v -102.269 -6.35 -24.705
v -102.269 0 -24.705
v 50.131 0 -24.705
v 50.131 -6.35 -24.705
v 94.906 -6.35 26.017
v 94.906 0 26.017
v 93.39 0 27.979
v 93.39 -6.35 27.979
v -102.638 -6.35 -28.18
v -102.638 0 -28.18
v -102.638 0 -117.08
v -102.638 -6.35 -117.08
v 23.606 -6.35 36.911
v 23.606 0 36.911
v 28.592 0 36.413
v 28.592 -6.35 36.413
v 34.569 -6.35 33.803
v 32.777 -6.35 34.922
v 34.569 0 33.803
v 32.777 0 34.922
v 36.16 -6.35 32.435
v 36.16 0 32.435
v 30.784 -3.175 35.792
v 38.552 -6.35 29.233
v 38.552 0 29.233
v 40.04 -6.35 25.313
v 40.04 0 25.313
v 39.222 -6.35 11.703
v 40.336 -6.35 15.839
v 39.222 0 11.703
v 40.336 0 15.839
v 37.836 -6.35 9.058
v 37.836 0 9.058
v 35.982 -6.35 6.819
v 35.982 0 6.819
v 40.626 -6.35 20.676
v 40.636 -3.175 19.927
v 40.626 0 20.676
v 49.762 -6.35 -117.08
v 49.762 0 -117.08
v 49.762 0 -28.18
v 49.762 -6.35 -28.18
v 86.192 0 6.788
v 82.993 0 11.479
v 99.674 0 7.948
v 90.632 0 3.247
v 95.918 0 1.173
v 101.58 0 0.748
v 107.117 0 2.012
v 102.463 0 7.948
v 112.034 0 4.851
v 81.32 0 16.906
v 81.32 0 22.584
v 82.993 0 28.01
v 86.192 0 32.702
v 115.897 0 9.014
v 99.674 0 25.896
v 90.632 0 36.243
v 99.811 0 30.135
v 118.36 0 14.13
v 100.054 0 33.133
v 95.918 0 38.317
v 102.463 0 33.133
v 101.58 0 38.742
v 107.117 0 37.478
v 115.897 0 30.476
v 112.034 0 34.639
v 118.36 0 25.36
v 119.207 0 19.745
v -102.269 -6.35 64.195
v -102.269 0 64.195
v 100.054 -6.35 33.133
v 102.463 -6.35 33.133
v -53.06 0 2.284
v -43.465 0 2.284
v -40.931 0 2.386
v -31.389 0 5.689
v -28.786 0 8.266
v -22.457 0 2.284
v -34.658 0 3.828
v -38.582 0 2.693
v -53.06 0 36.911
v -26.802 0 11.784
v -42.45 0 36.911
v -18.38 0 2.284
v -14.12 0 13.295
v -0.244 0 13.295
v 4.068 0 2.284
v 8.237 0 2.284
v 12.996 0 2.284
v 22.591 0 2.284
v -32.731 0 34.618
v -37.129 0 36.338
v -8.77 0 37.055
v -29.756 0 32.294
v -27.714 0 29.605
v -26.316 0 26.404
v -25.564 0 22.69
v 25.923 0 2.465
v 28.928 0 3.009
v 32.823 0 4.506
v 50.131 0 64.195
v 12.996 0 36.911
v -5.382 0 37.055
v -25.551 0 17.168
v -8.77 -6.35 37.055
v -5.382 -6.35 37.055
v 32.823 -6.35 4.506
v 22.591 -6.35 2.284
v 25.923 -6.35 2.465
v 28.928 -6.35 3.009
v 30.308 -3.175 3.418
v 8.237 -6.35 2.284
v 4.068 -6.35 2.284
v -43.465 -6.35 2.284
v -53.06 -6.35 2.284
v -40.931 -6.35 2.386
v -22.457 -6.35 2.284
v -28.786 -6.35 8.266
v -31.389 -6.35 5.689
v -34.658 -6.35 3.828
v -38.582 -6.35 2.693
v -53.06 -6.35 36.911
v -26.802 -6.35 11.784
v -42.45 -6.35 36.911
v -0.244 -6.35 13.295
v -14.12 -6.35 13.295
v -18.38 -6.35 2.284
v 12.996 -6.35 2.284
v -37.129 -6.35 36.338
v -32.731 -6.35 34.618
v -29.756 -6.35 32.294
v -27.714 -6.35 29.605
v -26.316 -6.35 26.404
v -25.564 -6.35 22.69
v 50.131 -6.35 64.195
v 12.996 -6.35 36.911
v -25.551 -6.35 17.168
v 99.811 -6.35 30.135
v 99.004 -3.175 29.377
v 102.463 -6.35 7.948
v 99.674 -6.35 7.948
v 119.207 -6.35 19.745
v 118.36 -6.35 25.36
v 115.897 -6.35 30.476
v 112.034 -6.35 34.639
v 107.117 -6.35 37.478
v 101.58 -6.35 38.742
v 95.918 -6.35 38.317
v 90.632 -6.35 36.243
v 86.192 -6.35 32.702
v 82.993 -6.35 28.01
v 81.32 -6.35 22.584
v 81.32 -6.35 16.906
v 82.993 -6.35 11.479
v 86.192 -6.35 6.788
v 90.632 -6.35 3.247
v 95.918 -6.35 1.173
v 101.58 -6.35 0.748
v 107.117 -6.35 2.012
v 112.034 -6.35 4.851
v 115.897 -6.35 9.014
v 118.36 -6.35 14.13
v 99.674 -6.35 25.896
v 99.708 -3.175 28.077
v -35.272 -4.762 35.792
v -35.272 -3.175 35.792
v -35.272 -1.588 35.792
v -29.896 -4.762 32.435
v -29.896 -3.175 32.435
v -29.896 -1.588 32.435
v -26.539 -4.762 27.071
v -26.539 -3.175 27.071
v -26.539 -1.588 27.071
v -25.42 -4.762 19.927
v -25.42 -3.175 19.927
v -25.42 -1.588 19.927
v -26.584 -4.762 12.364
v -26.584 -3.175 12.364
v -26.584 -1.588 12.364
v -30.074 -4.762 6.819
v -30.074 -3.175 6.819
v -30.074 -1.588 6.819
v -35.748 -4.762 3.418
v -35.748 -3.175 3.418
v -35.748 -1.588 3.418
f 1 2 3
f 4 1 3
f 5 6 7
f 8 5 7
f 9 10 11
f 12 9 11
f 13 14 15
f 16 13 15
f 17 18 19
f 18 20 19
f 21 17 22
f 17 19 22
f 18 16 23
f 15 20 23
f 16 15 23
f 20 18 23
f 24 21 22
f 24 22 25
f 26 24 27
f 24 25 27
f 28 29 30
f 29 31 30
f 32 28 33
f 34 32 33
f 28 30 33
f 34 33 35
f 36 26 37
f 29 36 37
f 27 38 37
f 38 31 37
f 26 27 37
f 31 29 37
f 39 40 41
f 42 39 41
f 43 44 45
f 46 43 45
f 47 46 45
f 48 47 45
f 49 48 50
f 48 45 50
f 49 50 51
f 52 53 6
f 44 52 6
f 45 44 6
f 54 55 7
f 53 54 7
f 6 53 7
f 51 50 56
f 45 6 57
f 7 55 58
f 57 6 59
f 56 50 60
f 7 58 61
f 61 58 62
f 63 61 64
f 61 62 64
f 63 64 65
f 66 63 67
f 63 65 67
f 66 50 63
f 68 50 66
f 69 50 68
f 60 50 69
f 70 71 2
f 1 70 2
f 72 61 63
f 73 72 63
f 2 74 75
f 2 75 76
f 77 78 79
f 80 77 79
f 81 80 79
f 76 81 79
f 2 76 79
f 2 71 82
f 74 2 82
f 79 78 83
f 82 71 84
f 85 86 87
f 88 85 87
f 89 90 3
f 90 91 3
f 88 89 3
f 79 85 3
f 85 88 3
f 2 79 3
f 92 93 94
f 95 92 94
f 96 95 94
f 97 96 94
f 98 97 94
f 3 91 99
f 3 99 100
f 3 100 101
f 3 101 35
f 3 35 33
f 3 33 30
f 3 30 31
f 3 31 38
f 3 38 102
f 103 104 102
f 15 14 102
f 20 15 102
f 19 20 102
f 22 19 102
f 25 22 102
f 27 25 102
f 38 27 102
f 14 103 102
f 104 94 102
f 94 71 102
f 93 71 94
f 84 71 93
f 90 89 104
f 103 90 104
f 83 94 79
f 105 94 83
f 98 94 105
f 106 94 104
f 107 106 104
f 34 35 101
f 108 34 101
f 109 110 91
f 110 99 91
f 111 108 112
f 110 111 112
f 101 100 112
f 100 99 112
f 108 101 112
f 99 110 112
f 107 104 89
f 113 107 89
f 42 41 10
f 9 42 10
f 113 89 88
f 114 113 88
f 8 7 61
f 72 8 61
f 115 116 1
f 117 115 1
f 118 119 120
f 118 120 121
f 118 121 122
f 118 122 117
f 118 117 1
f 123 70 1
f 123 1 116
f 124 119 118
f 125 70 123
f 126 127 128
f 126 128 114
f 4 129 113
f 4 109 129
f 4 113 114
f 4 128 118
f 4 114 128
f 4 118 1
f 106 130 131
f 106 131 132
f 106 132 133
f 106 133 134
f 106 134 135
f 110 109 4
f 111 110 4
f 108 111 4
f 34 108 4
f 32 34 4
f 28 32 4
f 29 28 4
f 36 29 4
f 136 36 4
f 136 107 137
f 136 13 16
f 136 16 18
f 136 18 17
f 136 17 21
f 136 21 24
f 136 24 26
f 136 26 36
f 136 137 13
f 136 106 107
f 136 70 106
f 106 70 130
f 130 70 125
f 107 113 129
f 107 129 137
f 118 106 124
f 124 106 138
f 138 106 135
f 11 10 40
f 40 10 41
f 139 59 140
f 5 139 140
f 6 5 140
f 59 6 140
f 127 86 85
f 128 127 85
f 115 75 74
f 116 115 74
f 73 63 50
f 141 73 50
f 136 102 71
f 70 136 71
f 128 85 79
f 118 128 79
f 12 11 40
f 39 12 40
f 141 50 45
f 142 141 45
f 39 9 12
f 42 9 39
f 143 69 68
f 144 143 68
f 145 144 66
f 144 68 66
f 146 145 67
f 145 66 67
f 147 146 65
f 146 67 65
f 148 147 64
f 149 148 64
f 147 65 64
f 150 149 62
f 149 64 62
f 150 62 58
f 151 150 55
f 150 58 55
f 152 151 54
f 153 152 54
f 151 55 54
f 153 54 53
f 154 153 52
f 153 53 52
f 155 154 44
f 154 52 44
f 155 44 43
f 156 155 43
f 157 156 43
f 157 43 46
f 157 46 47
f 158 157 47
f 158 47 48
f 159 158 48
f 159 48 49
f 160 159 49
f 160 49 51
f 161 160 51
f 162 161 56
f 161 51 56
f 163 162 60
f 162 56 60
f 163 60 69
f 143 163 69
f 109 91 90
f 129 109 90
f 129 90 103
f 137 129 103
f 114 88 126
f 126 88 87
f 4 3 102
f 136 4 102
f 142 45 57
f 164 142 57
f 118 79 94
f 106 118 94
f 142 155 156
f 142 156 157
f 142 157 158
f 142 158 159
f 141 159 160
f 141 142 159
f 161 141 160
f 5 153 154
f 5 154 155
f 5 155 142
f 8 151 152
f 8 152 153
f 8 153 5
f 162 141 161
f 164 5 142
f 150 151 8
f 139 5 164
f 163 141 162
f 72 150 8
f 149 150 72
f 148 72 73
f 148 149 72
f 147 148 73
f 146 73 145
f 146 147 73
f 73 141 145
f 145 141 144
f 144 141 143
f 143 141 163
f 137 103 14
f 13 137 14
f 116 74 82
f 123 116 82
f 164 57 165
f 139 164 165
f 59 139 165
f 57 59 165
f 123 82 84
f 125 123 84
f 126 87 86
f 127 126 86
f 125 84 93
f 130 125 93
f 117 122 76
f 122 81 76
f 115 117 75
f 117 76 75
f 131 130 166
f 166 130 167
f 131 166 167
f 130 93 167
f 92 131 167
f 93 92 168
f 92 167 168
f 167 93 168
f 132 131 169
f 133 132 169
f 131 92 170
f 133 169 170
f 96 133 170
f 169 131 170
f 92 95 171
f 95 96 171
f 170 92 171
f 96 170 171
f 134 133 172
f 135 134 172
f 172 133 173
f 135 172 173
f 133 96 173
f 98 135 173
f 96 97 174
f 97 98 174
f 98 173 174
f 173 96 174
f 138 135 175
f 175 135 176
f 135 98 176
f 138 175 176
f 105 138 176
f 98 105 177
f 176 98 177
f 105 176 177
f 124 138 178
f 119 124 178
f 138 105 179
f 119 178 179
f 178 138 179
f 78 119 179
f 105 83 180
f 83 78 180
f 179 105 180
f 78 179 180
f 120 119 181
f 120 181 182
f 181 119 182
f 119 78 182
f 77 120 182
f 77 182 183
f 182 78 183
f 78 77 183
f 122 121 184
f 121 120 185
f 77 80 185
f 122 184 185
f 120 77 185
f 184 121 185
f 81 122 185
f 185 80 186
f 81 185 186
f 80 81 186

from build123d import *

# Parameters (mm, degrees)
F0_R     = 19.05
F1_DEPTH = 6.35
F2_DEPTH = 6.35
F3_DEPTH = 6.35


with BuildPart() as f1:
    # F0 (on Front) → F1 (new body)
    with BuildSketch(Plane.XZ):
        with Locations((100.1567976203, 19.7448887793)):
            Circle(F0_R)
        with BuildLine():
            Line((102.462814241, 33.1331300803), (102.462814241, 7.9481040387))
            Line((102.462814241, 7.9481040387), (99.6736649354, 7.9481040387))
            Line((99.6736649354, 7.9481040387), (99.6736649354, 25.8956734831))
            add(Edge.make_bspline(
                [(99.6736649354, 25.8956734831), (99.6736649354, 28.1391196637), (99.8114687549, 30.1345189692)],
                knots=[0, 0, 0, 1, 1, 1], degree=2))
            add(Edge.make_bspline(
                [(99.8114687549, 30.1345189692), (99.4531788243, 29.7707168859), (99.0039383729, 29.3765979623)],
                knots=[0, 0, 0, 1, 1, 1], degree=2))
            add(Edge.make_bspline(
                [(99.0039383729, 29.3765979623), (98.5546979215, 28.9824790387), (94.9056527827, 26.0169408442)],
                knots=[0, 0, 0, 1, 1, 1], degree=2))
            Line((94.9056527827, 26.0169408442), (93.3898107688, 27.9792672331))
            Line((93.3898107688, 27.9792672331), (100.0540034771, 33.1331300803))
            Line((100.0540034771, 33.1331300803), (102.462814241, 33.1331300803))
        make_face(mode=Mode.SUBTRACT)
    extrude(amount=F1_DEPTH)


with BuildPart() as f2:
    # F0 (on Front) → F2 (new body)
    with BuildSketch(Plane.XZ):
        Polygon((50.1307671558, 64.1948887793), (-7.0192328442, 64.1948887793), (-102.2692328442, 64.1948887793), (-102.2692328442, -24.7051112207), (-7.0192328442, -24.7051112207), (50.1307671558, -24.7051112207), align=None)
        with BuildLine():
            add(Edge.make_bspline(
                [(-29.8955270409, 32.4354154092), (-25.4203069902, 27.9601953585), (-25.4203069902, 19.9267774859)],
                knots=[0, 0, 0, 1, 1, 1], degree=2))
            add(Edge.make_bspline(
                [(-25.4203069902, 19.9267774859), (-25.4203069902, 11.3552721898), (-30.0736263994, 6.8194225702)],
                knots=[0, 0, 0, 1, 1, 1], degree=2))
            add(Edge.make_bspline(
                [(-30.0736263994, 6.8194225702), (-34.7269458086, 2.2835729506), (-43.4651824191, 2.2835729506)],
                knots=[0, 0, 0, 1, 1, 1], degree=2))
            Line((-43.4651824191, 2.2835729506), (-53.0598116895, 2.2835729506))
            Line((-53.0598116895, 2.2835729506), (-53.0598116895, 36.9106354599))
            Line((-53.0598116895, 36.9106354599), (-42.4496371408, 36.9106354599))
            add(Edge.make_bspline(
                [(-42.4496371408, 36.9106354599), (-34.3707470916, 36.9106354599), (-29.8955270409, 32.4354154092)],
                knots=[0, 0, 0, 1, 1, 1], degree=2))
        make_face(mode=Mode.SUBTRACT)
        Polygon((8.2366824176, 2.2835729506), (4.0683995592, 2.2835729506), (-0.2438785253, 13.295418393), (-14.1204710958, 13.295418393), (-18.3796983075, 2.2835729506), (-22.4570368126, 2.2835729506), (-8.7699116448, 37.054630686), (-5.3822344853, 37.054630686), align=None, mode=Mode.SUBTRACT)
        with BuildLine():
            add(Edge.make_bspline(
                [(36.1603882209, 32.4354154092), (40.6356082717, 27.9601953585), (40.6356082717, 19.9267774859)],
                knots=[0, 0, 0, 1, 1, 1], degree=2))
            add(Edge.make_bspline(
                [(40.6356082717, 19.9267774859), (40.6356082717, 11.3552721898), (35.9822888625, 6.8194225702)],
                knots=[0, 0, 0, 1, 1, 1], degree=2))
            add(Edge.make_bspline(
                [(35.9822888625, 6.8194225702), (31.3289694532, 2.2835729506), (22.5907328428, 2.2835729506)],
                knots=[0, 0, 0, 1, 1, 1], degree=2))
            Line((22.5907328428, 2.2835729506), (12.9961035723, 2.2835729506))
            Line((12.9961035723, 2.2835729506), (12.9961035723, 36.9106354599))
            Line((12.9961035723, 36.9106354599), (23.606278121, 36.9106354599))
            add(Edge.make_bspline(
                [(23.606278121, 36.9106354599), (31.6851681702, 36.9106354599), (36.1603882209, 32.4354154092)],
                knots=[0, 0, 0, 1, 1, 1], degree=2))
        make_face(mode=Mode.SUBTRACT)
    extrude(amount=F2_DEPTH)


with BuildPart() as f3:
    # F0 (on Front) → F3 (new body)
    with BuildSketch(Plane.XZ):
        Polygon((49.7624414408, -28.1795670637), (-7.3875585592, -28.1795670637), (-102.6375585592, -28.1795670637), (-102.6375585592, -117.0795670637), (49.7624414408, -117.0795670637), align=None)
    extrude(amount=F3_DEPTH)


solid = Compound([f1.part, f2.part, f3.part])
